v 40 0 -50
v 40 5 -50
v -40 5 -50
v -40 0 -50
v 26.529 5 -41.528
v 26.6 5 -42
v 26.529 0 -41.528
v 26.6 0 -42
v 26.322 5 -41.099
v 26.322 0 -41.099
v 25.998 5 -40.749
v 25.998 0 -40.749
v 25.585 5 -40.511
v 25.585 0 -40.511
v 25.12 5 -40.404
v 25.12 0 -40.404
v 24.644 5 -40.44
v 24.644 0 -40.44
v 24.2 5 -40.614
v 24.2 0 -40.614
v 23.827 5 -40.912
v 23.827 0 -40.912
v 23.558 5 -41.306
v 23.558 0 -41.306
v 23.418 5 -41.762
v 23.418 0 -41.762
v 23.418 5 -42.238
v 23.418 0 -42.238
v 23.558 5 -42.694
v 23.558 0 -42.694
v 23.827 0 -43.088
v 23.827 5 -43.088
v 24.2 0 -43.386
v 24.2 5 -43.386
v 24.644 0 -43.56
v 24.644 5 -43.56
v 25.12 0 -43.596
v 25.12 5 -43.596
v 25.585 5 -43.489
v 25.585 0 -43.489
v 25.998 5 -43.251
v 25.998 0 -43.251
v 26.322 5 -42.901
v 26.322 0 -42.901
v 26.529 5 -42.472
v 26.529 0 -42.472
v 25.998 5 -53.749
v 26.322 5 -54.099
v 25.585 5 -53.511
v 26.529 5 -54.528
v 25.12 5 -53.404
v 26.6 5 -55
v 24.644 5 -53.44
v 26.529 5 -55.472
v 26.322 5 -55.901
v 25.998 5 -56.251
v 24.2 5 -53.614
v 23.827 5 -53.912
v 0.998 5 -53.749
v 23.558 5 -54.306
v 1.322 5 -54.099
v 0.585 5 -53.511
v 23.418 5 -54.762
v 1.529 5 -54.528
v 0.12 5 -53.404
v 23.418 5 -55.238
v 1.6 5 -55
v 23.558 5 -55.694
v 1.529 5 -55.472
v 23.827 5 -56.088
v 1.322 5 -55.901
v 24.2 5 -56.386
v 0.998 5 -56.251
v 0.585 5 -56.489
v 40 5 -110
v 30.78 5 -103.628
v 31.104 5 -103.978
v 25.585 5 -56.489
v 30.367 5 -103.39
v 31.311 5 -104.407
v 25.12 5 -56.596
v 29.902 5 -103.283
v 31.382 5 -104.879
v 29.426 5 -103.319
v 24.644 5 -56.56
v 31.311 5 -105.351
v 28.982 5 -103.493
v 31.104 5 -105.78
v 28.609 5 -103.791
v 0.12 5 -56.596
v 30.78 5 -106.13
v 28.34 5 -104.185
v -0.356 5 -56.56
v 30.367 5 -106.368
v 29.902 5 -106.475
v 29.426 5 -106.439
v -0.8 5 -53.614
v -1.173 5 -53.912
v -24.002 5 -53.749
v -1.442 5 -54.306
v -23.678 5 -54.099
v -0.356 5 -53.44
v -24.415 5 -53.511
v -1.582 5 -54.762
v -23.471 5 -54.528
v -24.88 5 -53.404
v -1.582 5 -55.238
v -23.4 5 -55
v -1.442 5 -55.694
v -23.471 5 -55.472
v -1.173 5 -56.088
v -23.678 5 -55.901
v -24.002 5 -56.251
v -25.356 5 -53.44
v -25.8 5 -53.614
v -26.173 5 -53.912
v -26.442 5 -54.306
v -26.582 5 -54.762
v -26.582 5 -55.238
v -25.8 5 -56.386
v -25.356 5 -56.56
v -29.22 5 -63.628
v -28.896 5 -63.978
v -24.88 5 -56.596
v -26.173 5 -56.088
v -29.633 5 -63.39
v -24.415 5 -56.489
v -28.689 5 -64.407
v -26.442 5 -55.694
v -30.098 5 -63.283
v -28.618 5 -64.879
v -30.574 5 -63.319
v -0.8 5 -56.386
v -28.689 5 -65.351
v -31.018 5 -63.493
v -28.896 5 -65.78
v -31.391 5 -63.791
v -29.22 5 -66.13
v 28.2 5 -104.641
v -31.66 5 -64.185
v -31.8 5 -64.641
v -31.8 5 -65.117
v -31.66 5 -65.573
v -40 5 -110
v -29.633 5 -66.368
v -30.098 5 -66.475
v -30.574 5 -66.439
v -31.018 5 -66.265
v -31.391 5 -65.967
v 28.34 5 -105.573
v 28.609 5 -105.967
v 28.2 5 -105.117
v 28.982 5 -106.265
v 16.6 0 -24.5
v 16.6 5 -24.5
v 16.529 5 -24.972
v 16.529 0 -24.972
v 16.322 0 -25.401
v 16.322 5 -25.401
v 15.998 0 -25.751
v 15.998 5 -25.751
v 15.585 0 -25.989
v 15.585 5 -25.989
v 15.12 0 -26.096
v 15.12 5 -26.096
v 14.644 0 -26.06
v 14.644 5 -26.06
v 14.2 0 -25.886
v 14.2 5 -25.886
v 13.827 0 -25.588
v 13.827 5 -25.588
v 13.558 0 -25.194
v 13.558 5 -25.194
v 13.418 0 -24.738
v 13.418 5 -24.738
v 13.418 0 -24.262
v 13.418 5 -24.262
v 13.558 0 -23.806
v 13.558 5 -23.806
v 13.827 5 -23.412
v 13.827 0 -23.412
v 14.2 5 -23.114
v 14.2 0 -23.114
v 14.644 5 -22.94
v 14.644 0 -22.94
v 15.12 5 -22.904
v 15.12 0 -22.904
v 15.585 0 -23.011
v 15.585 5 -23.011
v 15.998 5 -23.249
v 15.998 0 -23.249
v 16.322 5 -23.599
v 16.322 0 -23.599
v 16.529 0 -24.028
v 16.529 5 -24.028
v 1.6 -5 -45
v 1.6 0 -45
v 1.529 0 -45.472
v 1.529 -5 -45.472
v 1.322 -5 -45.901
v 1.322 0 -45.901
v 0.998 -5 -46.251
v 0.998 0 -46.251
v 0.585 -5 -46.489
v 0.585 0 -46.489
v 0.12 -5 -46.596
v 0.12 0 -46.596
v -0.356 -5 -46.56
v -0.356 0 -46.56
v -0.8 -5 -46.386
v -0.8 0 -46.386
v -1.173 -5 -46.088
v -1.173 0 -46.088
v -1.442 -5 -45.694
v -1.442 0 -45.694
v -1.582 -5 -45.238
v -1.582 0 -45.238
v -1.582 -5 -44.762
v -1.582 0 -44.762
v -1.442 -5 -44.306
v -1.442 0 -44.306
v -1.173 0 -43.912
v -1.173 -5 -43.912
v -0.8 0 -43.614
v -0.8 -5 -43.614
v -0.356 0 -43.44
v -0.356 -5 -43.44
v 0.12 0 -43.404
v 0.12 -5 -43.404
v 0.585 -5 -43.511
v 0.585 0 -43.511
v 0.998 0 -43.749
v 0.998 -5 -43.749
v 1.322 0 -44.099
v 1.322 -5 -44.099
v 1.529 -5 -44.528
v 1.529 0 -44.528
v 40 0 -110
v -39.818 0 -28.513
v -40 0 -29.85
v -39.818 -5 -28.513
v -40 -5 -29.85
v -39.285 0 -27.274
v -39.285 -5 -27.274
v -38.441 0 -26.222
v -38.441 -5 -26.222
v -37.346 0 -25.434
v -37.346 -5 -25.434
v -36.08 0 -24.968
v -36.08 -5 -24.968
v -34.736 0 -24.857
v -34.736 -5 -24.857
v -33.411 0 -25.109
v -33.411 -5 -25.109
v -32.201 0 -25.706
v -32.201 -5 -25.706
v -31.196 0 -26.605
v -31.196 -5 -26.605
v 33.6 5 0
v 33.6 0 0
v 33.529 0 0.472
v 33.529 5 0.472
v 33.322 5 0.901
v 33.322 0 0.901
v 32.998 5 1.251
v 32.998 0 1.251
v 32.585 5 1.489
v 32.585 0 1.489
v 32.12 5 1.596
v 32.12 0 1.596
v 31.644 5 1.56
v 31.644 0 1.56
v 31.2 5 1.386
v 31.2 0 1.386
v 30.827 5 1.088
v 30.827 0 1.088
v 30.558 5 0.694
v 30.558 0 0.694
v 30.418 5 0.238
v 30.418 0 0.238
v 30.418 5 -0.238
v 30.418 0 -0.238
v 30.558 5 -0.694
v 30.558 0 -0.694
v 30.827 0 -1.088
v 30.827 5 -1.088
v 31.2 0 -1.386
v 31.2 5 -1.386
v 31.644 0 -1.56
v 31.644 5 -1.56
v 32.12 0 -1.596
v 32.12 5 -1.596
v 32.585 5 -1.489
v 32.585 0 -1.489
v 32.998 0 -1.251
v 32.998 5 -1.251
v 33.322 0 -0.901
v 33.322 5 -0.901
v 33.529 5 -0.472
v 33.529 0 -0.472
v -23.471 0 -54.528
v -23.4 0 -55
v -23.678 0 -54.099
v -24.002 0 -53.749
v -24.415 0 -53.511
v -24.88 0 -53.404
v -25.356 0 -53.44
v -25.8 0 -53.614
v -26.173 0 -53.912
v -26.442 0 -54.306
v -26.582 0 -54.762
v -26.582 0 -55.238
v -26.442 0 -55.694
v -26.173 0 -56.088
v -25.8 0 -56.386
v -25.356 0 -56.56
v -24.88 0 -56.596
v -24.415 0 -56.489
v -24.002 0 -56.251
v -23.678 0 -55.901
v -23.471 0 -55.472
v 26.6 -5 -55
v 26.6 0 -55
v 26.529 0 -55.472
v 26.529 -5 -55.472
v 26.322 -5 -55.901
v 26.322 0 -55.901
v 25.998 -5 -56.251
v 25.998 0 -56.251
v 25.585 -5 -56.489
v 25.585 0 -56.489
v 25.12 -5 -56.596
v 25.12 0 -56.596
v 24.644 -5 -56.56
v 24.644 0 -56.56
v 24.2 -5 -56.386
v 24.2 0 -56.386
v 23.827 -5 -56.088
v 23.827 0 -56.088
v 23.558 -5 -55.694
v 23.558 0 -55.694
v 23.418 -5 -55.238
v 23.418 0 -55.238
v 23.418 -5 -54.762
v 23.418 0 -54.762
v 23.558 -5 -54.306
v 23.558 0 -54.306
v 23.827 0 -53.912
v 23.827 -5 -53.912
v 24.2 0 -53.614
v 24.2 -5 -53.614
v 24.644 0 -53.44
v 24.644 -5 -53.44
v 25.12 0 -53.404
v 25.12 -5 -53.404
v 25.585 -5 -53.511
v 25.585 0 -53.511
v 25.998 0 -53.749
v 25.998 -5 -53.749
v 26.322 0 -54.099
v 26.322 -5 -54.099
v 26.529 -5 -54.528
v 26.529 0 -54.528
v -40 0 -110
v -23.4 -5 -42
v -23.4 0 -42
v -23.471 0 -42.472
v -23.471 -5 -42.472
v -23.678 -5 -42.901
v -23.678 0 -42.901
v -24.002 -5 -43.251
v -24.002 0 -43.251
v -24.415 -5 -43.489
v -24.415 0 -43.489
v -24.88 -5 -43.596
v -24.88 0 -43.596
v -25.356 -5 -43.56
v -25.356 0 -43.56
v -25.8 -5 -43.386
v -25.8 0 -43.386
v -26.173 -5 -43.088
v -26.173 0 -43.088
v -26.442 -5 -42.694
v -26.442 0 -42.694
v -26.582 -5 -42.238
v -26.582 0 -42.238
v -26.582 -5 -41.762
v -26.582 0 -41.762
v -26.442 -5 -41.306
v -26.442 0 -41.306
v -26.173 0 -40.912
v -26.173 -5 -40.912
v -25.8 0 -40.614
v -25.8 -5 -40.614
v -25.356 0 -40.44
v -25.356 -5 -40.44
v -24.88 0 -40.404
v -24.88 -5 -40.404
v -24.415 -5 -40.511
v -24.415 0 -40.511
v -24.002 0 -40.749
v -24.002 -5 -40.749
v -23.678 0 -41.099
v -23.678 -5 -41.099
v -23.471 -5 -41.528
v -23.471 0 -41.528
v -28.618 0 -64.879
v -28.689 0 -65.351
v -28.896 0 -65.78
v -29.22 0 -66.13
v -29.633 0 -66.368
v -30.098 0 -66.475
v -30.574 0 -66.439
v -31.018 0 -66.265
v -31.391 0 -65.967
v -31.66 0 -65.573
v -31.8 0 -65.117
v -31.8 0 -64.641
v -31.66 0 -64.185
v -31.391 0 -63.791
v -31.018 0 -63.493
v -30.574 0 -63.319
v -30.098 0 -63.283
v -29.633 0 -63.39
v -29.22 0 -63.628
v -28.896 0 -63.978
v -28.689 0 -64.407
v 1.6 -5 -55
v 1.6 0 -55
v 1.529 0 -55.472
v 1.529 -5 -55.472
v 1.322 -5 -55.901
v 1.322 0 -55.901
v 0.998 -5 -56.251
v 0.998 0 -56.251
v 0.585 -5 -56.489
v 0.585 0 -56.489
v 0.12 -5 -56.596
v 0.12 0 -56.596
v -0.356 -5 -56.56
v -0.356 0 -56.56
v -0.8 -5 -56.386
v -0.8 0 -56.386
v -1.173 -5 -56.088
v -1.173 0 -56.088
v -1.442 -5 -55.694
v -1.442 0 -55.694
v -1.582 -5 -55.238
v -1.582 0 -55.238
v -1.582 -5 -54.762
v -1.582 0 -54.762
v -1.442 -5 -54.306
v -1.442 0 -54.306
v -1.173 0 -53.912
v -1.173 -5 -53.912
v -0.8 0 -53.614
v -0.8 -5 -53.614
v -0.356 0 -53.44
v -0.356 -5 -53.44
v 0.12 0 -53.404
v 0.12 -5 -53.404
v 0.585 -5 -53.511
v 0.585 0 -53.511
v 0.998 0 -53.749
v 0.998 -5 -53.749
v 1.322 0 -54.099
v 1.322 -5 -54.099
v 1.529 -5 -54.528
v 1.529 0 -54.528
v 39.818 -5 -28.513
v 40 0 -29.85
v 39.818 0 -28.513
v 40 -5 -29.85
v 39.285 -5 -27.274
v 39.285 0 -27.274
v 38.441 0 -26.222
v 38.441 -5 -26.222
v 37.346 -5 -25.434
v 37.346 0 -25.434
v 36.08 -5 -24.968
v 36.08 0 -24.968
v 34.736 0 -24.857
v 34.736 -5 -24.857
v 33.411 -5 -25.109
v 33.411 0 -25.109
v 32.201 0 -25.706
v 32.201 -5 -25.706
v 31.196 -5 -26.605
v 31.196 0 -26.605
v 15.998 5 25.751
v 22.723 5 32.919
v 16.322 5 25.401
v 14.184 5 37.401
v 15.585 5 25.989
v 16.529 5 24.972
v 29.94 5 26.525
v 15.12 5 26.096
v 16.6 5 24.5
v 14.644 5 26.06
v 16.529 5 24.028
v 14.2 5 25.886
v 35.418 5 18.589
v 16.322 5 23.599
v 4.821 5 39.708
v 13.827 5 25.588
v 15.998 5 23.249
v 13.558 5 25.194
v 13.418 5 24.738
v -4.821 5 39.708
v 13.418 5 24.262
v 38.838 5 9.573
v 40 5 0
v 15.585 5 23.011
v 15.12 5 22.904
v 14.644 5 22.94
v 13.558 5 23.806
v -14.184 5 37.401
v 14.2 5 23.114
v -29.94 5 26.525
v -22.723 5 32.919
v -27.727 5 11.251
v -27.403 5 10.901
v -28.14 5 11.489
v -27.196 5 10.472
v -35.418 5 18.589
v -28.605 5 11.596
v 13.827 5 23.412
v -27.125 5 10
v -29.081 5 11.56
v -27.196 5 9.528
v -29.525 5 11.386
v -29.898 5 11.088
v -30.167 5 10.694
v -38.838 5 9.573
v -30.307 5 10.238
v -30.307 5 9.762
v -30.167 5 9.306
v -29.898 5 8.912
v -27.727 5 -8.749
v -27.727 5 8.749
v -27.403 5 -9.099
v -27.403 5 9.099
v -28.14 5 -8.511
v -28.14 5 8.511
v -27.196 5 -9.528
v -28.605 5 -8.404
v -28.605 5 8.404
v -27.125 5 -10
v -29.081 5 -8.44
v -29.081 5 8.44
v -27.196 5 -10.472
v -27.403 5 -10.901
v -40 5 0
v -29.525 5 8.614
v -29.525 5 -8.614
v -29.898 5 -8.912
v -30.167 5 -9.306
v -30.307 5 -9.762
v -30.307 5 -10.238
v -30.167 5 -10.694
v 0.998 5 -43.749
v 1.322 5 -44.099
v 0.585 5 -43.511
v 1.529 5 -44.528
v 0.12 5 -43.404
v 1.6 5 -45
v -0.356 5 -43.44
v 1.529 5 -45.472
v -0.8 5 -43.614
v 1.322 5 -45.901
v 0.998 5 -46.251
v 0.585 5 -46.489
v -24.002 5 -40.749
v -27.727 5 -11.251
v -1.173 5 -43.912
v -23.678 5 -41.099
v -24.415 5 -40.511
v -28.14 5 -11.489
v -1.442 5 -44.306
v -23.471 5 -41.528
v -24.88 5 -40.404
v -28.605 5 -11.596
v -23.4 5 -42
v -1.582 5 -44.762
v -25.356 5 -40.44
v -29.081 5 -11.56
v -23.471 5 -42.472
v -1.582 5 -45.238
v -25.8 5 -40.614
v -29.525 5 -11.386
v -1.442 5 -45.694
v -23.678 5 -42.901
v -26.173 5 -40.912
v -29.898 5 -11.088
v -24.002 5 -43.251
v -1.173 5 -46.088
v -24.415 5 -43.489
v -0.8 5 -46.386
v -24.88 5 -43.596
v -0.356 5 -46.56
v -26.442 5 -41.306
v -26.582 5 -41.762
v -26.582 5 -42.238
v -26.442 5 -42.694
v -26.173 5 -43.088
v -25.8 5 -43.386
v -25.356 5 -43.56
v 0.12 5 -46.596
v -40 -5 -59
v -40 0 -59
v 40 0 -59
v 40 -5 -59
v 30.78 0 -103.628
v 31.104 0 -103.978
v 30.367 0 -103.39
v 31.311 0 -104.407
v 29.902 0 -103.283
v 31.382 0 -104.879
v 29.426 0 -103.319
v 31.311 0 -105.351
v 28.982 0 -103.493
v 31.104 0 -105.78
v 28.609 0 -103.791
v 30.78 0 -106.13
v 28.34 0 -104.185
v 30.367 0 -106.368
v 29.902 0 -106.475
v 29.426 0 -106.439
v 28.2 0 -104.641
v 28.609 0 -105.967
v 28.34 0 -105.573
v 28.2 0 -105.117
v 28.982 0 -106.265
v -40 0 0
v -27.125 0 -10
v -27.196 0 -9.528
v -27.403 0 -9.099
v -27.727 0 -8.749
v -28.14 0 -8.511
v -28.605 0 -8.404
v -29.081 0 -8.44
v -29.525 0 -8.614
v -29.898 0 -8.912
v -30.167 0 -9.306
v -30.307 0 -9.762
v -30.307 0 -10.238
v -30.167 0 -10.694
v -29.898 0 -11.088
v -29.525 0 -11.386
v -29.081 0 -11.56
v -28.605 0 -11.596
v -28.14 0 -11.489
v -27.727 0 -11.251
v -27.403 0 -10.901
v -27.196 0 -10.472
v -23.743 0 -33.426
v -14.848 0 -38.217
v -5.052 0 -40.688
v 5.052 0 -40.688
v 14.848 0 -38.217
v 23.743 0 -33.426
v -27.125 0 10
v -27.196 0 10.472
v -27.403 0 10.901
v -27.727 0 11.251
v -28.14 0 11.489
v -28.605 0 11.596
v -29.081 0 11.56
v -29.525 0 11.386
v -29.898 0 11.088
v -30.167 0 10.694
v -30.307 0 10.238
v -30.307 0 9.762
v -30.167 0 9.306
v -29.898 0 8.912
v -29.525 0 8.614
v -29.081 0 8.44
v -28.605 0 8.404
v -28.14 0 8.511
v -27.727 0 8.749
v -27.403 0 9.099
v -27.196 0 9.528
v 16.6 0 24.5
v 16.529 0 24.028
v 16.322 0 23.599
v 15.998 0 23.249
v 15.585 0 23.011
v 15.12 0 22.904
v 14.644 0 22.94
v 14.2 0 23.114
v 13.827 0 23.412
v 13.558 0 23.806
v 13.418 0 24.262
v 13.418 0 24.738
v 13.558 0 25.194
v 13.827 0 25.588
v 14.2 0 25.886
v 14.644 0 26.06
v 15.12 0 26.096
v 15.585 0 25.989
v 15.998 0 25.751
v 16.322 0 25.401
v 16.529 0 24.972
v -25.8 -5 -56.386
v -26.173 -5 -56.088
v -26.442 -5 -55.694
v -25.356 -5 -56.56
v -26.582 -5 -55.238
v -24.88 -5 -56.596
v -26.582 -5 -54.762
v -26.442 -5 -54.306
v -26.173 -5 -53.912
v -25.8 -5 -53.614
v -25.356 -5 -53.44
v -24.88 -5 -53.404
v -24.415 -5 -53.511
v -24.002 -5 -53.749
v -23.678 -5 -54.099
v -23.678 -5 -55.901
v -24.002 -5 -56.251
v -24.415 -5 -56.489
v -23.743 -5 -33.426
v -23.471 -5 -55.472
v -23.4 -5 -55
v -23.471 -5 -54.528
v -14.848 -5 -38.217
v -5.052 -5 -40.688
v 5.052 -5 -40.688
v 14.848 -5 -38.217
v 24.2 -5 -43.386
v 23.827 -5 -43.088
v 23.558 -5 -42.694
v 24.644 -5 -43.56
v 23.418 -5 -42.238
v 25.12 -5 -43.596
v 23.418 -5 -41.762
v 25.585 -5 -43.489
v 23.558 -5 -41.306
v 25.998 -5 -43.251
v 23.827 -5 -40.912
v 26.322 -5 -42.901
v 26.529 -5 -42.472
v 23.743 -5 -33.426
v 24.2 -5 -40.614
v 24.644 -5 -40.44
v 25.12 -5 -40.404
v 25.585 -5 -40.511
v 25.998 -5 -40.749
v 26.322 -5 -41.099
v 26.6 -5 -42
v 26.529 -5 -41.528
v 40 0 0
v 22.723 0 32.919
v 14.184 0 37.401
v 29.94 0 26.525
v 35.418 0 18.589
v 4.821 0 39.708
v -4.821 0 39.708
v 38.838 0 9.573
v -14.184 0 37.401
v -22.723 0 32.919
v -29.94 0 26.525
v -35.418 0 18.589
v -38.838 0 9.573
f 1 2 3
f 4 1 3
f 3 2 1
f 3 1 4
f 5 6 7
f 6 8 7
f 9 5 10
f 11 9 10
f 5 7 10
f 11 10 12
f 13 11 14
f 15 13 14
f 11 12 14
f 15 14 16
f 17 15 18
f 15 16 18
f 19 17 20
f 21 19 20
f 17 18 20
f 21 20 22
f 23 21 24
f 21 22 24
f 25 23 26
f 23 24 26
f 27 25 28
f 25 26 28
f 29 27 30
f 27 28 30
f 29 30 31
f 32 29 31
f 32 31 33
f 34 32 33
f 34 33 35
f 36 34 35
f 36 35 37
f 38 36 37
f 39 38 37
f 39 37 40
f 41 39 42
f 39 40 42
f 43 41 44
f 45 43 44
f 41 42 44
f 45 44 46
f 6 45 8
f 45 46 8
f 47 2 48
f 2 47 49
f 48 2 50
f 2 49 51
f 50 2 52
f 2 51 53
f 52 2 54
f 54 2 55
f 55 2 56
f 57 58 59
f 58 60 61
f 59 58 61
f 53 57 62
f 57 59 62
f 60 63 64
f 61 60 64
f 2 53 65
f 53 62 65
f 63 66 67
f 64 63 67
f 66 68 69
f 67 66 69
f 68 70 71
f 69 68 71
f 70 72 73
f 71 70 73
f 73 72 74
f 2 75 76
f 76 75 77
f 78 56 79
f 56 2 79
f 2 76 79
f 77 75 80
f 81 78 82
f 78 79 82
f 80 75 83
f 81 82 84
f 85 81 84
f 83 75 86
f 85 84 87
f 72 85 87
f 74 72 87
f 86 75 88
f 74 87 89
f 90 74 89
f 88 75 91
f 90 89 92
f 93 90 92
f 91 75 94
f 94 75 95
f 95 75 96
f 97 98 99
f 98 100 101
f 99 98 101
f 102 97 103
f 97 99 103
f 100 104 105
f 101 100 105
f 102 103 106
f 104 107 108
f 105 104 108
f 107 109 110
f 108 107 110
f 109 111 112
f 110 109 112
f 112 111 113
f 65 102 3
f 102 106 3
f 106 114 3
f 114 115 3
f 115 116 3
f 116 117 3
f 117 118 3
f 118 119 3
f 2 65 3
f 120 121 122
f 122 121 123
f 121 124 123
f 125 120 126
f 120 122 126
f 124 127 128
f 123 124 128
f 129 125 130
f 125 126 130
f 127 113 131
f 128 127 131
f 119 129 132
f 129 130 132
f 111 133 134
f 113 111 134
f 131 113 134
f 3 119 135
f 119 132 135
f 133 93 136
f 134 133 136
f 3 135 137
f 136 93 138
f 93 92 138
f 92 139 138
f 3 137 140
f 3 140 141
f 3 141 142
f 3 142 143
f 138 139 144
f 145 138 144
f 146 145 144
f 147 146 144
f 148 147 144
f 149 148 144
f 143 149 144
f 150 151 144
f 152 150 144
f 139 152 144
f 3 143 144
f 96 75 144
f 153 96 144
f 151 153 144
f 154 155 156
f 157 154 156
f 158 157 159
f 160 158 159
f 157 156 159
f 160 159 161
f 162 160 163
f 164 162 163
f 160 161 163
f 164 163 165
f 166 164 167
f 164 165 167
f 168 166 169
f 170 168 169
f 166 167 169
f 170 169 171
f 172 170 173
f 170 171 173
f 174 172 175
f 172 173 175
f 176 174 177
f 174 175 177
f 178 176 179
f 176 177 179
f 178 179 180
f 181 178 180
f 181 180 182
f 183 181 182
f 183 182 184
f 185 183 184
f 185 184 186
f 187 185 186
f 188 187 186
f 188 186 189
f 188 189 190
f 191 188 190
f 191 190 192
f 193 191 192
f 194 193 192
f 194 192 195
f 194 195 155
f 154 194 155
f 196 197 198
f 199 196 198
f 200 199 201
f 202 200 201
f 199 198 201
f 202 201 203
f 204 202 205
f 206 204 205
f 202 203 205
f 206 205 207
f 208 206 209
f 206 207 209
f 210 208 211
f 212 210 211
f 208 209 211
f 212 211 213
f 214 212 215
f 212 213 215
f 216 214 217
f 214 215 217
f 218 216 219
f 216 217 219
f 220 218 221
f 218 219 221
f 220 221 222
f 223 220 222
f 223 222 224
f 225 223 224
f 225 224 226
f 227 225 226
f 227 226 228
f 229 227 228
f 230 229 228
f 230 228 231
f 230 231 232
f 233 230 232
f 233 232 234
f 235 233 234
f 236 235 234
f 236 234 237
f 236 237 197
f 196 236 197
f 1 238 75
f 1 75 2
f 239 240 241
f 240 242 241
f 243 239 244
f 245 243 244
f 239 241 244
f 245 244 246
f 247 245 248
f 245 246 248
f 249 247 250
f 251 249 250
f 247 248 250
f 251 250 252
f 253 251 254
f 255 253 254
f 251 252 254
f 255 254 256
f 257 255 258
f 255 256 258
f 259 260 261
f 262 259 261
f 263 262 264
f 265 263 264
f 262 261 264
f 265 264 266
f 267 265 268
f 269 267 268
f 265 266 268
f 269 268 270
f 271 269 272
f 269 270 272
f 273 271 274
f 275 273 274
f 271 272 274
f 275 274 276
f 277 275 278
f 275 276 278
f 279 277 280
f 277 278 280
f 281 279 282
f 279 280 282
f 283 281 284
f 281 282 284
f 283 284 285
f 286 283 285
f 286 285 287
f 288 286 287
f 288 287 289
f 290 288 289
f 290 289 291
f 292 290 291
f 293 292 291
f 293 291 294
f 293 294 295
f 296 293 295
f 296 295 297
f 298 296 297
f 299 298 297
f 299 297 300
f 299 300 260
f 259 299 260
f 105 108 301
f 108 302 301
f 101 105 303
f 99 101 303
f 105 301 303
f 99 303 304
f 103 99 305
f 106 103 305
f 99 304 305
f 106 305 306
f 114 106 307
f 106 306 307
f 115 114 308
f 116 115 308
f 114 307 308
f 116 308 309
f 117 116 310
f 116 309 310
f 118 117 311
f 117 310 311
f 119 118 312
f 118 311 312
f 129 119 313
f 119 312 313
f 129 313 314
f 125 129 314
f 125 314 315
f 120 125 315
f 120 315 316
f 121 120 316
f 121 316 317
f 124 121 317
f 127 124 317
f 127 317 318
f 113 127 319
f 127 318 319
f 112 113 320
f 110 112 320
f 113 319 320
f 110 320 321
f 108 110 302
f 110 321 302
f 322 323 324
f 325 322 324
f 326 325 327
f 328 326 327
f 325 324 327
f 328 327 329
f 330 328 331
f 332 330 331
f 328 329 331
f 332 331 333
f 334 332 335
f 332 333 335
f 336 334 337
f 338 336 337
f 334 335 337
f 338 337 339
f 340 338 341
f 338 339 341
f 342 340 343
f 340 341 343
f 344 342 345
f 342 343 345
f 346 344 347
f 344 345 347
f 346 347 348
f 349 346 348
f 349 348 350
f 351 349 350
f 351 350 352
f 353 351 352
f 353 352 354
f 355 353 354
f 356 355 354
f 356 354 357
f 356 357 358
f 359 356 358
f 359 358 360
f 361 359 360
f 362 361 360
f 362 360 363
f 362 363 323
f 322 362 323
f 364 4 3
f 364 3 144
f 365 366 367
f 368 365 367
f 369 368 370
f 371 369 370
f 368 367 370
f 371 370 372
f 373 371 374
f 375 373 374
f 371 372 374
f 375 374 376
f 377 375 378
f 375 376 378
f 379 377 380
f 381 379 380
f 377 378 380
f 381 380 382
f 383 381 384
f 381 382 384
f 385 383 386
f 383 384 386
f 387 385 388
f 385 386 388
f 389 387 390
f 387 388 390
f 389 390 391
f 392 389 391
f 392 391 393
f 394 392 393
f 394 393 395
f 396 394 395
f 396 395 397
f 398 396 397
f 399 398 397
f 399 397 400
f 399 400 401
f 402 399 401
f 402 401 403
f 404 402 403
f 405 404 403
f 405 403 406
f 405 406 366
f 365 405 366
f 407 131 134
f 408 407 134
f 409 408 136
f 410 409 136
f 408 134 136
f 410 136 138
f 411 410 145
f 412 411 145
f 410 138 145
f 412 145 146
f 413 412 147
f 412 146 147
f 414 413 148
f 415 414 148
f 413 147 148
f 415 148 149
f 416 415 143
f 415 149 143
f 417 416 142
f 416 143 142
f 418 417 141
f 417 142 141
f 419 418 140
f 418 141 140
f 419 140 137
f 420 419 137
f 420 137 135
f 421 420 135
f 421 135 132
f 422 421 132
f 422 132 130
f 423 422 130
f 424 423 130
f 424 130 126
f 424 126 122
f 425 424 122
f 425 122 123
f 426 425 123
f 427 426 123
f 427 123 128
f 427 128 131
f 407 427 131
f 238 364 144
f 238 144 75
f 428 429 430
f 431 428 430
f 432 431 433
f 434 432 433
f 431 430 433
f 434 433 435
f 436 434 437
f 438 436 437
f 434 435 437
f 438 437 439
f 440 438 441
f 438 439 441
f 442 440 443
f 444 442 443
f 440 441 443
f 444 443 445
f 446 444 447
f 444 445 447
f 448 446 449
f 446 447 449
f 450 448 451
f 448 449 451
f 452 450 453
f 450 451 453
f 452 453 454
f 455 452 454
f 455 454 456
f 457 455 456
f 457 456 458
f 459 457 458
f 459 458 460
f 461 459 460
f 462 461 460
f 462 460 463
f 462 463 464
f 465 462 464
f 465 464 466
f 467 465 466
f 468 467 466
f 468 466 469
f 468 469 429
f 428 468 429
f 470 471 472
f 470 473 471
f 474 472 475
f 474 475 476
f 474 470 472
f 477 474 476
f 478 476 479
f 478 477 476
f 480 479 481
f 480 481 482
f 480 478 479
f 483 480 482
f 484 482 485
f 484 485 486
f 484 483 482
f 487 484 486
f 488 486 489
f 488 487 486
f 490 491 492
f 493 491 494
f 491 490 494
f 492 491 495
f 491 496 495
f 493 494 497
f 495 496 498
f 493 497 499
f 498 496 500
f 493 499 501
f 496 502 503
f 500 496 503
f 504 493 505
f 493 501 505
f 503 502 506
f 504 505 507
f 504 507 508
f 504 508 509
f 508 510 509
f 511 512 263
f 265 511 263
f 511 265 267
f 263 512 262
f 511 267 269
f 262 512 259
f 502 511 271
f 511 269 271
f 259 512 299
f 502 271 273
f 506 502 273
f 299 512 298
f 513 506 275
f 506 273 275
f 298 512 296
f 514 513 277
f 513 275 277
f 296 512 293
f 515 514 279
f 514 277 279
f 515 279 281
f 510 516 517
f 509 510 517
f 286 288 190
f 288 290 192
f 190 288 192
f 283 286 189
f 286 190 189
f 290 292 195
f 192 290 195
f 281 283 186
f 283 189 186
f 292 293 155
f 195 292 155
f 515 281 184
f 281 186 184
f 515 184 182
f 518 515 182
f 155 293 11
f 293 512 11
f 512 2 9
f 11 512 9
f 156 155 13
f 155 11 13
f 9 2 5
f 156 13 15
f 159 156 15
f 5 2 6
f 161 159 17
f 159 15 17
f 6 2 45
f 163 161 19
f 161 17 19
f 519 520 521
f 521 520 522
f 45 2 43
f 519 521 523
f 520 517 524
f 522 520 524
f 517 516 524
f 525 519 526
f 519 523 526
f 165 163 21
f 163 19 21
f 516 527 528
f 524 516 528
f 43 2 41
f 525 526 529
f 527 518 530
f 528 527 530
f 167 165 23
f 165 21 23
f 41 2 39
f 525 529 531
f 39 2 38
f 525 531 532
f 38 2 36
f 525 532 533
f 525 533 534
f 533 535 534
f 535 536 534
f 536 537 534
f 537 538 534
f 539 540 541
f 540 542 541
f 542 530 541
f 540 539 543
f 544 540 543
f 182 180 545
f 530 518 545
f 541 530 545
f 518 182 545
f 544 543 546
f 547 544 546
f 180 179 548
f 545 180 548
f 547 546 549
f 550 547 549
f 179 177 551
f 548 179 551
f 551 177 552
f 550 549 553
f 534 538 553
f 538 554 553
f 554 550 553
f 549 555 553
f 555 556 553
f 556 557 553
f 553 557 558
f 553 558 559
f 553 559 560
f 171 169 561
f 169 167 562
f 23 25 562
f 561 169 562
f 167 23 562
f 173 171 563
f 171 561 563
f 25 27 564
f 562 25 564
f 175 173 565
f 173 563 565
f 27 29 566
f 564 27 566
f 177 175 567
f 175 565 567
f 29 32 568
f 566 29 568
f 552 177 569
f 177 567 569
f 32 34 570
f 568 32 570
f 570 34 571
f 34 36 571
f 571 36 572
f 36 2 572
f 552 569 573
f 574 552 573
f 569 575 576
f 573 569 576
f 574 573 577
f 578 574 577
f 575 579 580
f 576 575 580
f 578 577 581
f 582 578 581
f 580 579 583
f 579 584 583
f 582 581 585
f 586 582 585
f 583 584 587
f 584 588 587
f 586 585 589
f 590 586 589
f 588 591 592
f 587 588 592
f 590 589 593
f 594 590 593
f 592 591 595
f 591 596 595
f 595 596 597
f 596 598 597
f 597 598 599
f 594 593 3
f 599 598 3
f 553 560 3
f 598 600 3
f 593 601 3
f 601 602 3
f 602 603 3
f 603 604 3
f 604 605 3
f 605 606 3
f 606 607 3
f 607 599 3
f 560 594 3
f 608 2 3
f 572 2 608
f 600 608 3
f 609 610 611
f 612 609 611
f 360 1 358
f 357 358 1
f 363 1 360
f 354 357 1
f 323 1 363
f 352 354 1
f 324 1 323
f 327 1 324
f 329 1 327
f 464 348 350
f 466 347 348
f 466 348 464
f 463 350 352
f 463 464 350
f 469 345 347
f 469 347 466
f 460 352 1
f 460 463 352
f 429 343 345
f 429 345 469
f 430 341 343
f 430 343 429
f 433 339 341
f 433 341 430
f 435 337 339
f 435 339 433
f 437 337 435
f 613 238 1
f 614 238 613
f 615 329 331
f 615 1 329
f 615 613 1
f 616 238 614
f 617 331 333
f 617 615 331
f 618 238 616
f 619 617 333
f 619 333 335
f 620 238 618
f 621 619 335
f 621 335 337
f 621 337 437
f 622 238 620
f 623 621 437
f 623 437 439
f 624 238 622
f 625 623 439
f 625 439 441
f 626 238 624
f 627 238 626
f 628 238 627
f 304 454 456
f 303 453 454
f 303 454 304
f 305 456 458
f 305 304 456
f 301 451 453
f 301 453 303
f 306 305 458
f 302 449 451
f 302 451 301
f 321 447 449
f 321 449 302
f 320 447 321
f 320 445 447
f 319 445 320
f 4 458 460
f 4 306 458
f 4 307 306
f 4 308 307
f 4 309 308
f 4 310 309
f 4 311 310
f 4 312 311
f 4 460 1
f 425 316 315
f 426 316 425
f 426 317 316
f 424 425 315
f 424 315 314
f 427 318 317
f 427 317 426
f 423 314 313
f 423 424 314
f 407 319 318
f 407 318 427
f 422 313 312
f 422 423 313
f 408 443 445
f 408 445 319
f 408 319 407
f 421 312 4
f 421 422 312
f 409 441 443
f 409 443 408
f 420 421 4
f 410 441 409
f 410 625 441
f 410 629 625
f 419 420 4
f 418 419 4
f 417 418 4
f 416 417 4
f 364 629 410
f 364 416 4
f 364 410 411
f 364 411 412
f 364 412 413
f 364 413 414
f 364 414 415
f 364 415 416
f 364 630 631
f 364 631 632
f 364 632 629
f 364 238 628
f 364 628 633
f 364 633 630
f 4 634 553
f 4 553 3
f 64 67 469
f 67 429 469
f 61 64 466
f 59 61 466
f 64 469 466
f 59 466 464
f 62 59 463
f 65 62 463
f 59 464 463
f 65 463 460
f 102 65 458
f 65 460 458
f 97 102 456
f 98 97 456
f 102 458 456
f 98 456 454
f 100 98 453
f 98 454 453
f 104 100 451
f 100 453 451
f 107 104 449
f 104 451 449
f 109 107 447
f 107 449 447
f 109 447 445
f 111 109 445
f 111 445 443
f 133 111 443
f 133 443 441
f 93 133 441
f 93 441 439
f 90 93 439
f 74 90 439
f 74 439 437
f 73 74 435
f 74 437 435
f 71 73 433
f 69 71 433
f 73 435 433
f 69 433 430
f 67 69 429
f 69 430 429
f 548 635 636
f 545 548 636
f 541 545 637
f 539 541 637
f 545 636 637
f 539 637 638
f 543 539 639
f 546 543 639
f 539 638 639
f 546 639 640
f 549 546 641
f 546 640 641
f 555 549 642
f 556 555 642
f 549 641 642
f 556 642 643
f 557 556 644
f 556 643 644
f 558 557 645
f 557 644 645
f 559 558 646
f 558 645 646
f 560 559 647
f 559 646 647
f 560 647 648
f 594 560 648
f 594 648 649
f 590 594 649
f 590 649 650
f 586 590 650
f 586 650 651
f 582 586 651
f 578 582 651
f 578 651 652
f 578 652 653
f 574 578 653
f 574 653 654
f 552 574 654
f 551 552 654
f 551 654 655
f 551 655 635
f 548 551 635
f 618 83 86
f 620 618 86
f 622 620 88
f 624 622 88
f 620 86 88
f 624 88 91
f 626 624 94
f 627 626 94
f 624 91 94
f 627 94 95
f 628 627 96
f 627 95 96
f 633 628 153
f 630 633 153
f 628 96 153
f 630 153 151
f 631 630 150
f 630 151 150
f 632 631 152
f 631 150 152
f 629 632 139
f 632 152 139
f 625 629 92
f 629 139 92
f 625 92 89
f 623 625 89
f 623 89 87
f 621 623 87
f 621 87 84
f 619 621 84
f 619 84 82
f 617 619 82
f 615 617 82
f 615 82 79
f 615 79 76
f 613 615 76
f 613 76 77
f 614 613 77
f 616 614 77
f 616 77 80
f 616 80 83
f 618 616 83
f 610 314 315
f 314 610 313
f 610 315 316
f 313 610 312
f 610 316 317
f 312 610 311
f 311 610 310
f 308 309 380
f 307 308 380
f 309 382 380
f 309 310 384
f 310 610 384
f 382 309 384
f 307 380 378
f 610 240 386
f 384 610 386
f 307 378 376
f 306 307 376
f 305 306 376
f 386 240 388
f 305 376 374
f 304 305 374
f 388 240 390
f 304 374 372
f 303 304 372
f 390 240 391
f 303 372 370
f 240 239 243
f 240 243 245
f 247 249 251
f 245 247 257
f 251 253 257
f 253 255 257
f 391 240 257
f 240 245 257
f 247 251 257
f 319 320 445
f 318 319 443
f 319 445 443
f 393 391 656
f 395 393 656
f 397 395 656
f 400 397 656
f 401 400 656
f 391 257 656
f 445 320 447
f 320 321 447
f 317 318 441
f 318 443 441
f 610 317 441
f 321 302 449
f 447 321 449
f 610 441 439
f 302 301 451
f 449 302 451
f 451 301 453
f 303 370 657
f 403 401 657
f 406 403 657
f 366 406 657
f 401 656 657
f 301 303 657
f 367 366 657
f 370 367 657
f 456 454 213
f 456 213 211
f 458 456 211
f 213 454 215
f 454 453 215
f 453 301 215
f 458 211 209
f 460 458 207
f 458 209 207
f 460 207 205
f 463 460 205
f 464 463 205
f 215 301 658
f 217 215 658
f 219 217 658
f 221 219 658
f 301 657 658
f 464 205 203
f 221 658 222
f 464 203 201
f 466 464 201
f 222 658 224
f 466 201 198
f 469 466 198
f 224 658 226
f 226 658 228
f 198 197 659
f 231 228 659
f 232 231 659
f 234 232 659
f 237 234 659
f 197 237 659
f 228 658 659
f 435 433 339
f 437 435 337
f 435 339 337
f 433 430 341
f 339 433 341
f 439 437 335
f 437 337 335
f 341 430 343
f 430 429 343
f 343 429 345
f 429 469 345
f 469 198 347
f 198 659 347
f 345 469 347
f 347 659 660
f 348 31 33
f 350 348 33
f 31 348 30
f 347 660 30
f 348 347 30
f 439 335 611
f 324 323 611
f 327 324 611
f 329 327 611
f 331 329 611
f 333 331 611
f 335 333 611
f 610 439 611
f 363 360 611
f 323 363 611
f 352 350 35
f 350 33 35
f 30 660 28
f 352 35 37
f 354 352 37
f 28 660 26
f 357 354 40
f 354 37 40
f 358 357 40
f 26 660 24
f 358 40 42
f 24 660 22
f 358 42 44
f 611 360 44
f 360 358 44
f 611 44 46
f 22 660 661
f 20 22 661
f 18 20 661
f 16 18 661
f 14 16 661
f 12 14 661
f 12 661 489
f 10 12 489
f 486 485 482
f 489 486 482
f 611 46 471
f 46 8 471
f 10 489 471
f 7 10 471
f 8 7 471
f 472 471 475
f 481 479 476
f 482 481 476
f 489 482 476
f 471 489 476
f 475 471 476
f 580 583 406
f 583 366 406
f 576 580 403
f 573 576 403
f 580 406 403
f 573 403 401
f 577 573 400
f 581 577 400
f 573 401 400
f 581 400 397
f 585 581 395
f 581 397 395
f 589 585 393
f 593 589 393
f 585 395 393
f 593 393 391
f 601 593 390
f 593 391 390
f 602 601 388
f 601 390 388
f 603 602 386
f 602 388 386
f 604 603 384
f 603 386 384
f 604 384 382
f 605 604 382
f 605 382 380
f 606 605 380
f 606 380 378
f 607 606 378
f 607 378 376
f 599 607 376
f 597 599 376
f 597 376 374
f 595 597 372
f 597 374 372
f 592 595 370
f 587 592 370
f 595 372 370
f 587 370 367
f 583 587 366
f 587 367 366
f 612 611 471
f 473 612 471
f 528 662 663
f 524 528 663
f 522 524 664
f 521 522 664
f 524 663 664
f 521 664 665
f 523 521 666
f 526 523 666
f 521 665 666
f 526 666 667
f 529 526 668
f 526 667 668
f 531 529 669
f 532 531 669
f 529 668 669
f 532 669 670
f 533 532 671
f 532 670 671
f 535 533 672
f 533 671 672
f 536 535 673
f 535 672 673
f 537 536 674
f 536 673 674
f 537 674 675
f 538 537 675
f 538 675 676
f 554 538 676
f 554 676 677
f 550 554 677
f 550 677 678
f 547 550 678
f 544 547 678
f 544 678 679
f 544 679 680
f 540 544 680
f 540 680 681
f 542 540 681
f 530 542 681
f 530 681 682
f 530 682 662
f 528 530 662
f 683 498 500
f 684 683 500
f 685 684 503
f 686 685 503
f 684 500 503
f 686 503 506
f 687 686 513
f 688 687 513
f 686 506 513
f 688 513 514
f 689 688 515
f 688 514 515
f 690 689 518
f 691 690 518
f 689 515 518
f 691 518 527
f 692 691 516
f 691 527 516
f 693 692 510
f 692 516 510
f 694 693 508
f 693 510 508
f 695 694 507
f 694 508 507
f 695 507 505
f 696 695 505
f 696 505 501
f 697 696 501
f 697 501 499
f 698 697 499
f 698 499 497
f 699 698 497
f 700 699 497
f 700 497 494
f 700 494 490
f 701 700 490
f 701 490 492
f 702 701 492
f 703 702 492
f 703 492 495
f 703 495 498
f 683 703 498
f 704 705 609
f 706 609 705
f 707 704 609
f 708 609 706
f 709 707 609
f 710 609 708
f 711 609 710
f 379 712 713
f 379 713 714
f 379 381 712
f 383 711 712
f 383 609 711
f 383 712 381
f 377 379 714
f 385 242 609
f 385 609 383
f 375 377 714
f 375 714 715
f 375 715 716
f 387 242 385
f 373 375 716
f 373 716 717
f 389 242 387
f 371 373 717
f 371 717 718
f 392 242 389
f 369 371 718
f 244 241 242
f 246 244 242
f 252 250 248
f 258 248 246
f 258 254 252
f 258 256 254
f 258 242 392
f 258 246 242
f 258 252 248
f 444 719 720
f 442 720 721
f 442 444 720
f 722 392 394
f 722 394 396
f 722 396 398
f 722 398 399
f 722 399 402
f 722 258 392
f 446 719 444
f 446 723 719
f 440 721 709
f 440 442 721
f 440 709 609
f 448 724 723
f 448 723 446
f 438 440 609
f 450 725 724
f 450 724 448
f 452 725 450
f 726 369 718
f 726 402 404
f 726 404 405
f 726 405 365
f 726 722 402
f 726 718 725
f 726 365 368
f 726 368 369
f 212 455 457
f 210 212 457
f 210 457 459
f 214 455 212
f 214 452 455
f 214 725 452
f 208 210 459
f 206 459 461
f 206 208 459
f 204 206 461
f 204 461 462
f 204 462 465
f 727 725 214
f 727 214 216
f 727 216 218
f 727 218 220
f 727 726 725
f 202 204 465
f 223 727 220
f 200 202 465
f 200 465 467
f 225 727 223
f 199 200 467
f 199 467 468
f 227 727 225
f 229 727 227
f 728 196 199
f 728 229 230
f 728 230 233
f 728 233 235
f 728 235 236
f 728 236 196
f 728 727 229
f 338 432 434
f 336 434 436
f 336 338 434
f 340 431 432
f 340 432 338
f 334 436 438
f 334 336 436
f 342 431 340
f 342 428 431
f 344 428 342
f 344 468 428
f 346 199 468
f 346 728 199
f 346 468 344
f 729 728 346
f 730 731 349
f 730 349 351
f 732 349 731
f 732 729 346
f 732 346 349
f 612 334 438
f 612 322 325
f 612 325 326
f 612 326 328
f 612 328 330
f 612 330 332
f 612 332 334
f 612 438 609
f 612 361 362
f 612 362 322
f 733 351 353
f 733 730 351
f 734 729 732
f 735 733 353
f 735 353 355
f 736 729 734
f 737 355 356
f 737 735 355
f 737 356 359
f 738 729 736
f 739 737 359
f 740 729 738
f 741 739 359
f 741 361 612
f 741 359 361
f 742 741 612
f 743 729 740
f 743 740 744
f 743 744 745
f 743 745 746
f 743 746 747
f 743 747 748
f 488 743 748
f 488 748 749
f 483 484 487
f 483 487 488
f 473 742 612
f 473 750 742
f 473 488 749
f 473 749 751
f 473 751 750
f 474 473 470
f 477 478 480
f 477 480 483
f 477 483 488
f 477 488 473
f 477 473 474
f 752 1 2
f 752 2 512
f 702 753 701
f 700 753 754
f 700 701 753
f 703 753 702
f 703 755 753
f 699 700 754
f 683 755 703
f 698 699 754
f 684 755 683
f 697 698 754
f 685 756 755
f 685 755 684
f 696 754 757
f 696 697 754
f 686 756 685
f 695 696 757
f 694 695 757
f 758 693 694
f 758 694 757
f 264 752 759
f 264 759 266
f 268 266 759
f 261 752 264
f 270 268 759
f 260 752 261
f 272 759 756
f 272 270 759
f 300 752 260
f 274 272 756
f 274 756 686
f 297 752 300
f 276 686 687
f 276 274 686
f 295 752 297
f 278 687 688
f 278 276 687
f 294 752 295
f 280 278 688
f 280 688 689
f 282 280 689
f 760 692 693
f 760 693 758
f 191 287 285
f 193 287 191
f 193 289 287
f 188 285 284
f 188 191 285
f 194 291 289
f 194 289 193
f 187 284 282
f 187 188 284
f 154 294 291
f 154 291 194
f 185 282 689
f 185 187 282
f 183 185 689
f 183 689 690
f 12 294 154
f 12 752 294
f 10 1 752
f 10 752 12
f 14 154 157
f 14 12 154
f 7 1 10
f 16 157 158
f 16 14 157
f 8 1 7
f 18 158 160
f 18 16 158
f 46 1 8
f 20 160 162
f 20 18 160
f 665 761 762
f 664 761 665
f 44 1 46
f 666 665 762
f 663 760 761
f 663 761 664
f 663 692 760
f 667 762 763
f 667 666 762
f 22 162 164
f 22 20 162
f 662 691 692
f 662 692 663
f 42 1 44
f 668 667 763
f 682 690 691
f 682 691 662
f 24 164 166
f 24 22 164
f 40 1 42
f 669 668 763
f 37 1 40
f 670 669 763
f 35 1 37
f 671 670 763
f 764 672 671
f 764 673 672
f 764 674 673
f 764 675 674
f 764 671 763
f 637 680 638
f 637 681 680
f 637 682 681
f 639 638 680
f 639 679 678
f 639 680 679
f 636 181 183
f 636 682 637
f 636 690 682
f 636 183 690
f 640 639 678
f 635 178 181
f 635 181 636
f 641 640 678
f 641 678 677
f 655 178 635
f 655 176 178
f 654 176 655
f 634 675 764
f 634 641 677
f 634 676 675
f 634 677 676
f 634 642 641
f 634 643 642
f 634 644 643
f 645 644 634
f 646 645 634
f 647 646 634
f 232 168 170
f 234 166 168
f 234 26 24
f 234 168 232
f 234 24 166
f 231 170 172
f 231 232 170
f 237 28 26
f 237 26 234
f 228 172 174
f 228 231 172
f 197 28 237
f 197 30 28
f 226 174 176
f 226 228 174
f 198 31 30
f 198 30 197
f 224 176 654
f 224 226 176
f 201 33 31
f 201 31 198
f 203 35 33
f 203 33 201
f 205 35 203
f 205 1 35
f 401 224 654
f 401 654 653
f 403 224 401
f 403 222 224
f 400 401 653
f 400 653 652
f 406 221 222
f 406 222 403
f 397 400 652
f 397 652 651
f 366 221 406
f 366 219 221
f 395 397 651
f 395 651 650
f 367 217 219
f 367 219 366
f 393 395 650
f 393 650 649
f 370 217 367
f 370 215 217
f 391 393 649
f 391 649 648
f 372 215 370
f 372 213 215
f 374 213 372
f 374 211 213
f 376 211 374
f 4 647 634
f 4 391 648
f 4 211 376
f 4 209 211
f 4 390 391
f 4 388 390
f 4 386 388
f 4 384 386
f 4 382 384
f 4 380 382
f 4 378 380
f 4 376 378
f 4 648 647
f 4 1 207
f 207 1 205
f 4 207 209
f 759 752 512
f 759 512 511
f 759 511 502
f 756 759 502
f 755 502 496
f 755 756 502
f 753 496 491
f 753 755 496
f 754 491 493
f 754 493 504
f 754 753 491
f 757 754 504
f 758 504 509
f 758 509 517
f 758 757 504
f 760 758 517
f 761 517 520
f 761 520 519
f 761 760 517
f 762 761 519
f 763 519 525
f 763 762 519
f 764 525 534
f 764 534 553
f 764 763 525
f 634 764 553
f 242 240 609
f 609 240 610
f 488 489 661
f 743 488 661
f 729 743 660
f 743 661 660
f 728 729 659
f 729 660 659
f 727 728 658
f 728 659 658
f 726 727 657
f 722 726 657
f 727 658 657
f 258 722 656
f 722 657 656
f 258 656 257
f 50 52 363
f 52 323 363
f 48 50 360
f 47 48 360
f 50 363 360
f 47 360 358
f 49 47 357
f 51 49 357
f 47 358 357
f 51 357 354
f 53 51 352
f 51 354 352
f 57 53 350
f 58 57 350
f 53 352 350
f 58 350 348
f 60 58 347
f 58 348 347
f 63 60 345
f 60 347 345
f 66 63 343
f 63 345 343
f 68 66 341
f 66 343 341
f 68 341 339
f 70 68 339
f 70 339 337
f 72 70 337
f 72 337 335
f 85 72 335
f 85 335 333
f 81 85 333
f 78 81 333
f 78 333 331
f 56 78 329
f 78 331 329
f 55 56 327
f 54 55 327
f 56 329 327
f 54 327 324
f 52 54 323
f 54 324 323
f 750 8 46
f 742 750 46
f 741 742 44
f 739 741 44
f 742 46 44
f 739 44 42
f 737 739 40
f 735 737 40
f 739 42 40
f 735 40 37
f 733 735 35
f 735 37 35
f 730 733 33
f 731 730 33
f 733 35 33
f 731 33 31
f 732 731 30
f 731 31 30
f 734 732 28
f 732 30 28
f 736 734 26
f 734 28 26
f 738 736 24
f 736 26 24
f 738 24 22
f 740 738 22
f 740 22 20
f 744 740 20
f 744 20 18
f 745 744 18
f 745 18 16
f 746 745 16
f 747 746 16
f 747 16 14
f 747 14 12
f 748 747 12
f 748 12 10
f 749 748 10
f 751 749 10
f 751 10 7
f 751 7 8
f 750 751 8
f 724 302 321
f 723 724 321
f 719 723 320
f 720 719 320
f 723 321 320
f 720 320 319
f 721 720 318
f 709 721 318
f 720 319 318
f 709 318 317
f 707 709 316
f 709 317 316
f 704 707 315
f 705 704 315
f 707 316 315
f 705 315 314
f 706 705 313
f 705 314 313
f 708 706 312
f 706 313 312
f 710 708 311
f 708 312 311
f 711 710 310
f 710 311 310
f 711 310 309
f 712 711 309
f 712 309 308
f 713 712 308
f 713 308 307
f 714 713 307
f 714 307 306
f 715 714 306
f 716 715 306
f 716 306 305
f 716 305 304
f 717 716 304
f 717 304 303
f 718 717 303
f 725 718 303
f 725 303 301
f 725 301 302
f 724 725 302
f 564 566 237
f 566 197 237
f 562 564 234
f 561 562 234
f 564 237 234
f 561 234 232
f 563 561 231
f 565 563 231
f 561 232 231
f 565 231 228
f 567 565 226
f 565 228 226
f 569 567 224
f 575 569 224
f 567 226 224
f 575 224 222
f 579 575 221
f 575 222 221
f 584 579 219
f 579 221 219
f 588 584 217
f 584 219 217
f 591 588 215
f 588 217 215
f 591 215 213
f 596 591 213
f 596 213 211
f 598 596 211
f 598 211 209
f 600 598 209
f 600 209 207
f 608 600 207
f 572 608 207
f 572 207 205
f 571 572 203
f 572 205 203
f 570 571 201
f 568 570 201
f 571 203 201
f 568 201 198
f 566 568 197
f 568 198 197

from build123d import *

# Parameters (mm, degrees)
EXTRUDE_1_DEPTH          = 5
SKETCH_2_R               = 1.6
CUT_EXTRUDE_1_DEPTH      = 10
SKETCH_3_R               = 1.6
CUT_EXTRUDE_2_DEPTH      = 10
SKETCH_4_R               = 1.6
CUT_EXTRUDE_3_DEPTH      = 10
SKETCH_5_R               = 1.6
CUT_EXTRUDE_4_DEPTH      = 1
CUT_EXTRUDE_4_DEPTH_BACK = 6
EXTRUDE_2_DEPTH          = 5
FILLET_1_R               = 5
SKETCH_7_R               = 1.6
CUT_EXTRUDE_5_DEPTH      = 39


with BuildPart() as part:
    # 草图1 → 凸台-拉伸1 (new body)
    with BuildSketch(Plane(origin=(0, 0, 0), x_dir=(1, 0, 0), z_dir=(0, 1, 0))):
        with BuildLine():
            Line((-40, 0), (-40, 110))
            Line((-40, 110), (40, 110))
            Line((40, 110), (40, 0))
            ThreePointArc((40, 0), (0, -40), (-40, 0))
        make_face()
    extrude(amount=EXTRUDE_1_DEPTH)

    # 草图2 → 切除-拉伸1 (cut)
    with BuildSketch(Plane(origin=(0, 5, 0), x_dir=(1, 0, 0), z_dir=(0, 1, 0))):
        with Locations((15, 24.5)):
            Circle(SKETCH_2_R)
        with Locations((15, -24.5)):
            Circle(SKETCH_2_R)
    extrude(amount=-CUT_EXTRUDE_1_DEPTH, mode=Mode.SUBTRACT)

    # 草图3 → 切除-拉伸2 (cut)
    with BuildSketch(Plane.XZ):
        with Locations((32, 0)):
            Circle(SKETCH_3_R)
        with Locations((-28.725, 10)):
            Circle(SKETCH_3_R)
        with Locations((-28.725, -10)):
            Circle(SKETCH_3_R)
    extrude(amount=-CUT_EXTRUDE_2_DEPTH, mode=Mode.SUBTRACT)

    # 草图4 → 切除-拉伸3 (cut)
    with BuildSketch(Plane(origin=(0, 5, 0), x_dir=(1, 0, 0), z_dir=(0, 1, 0))):
        with Locations((29.78201983, 104.879)):
            Circle(SKETCH_4_R)
        with Locations((-30.21798017, 64.879)):
            Circle(SKETCH_4_R)
    extrude(amount=-CUT_EXTRUDE_3_DEPTH, mode=Mode.SUBTRACT)


with BuildPart() as body_2:
    # Split Bodies 1: the piece on the far side of the plane
    add(part.part)
    split(bisect_by=Plane(origin=(0, 0, -50), x_dir=(-1, 0, 0), z_dir=(0, 0, -1)), keep=Keep.BOTTOM)


with BuildPart() as part_1:
    add(part.part)

    # Split Bodies 1
    split(bisect_by=Plane(origin=(0, 0, -50), x_dir=(-1, 0, 0), z_dir=(0, 0, -1)), keep=Keep.TOP)


with BuildPart() as cut_extrude_4_tool:
    # 草图5 → 切除-拉伸4 (new body, two sides)
    with BuildSketch(Plane.XZ) as cut_extrude_4_sk:
        with Locations((25, -55)):
            Circle(SKETCH_5_R)
        with Locations((0, -55)):
            Circle(SKETCH_5_R)
        with Locations((-25, -55)):
            Circle(SKETCH_5_R)
        with Locations((0, -45)):
            Circle(SKETCH_5_R)
        with Locations((-25, -42)):
            Circle(SKETCH_5_R)
        with Locations((25, -42)):
            Circle(SKETCH_5_R)
    extrude(amount=CUT_EXTRUDE_4_DEPTH)
    extrude(cut_extrude_4_sk.sketch, amount=-CUT_EXTRUDE_4_DEPTH_BACK)


with BuildPart() as part_2:
    add(part_1.part)

    # 切除-拉伸4: cut by cut_extrude_4_tool
    add(cut_extrude_4_tool.part, mode=Mode.SUBTRACT)


with BuildPart() as body_2_1:
    add(body_2.part)

    # 切除-拉伸4: cut by cut_extrude_4_tool
    add(cut_extrude_4_tool.part, mode=Mode.SUBTRACT)


with BuildPart() as body_3:
    # 草图6 → 凸台-拉伸2 (new body)
    with BuildSketch(Plane.XZ):
        with BuildLine():
            Line((-40, -9), (-40, -59))
            Line((-40, -59), (40, -59))
            Line((40, -59), (40, -9))
            ThreePointArc((40, -9), (0, -41), (-40, -9))
        make_face()
    extrude(amount=EXTRUDE_2_DEPTH)

    # 圆角1
    fillet_1_edges = [body_3.edges().sort_by_distance(p)[0] for p in [
        (40, -2.5, -9),
        (-40, -2.5, -9),
    ]]
    fillet(fillet_1_edges, radius=FILLET_1_R)

    # 草图7 → 切除-拉伸5 (cut)
    with BuildSketch(Plane(origin=(0, 5, 0), x_dir=(1, 0, 0), z_dir=(0, 1, 0))):
        with Locations((25, 42)):
            Circle(SKETCH_7_R)
        with Locations((25, 55)):
            Circle(SKETCH_7_R)
        with Locations((0, 45)):
            Circle(SKETCH_7_R)
        with Locations((0, 55)):
            Circle(SKETCH_7_R)
        with Locations((-25, 42)):
            Circle(SKETCH_7_R)
        with Locations((-25, 55)):
            Circle(SKETCH_7_R)
    extrude(amount=-CUT_EXTRUDE_5_DEPTH, mode=Mode.SUBTRACT)


solid = Compound([part_2.part, body_2_1.part, body_3.part])
